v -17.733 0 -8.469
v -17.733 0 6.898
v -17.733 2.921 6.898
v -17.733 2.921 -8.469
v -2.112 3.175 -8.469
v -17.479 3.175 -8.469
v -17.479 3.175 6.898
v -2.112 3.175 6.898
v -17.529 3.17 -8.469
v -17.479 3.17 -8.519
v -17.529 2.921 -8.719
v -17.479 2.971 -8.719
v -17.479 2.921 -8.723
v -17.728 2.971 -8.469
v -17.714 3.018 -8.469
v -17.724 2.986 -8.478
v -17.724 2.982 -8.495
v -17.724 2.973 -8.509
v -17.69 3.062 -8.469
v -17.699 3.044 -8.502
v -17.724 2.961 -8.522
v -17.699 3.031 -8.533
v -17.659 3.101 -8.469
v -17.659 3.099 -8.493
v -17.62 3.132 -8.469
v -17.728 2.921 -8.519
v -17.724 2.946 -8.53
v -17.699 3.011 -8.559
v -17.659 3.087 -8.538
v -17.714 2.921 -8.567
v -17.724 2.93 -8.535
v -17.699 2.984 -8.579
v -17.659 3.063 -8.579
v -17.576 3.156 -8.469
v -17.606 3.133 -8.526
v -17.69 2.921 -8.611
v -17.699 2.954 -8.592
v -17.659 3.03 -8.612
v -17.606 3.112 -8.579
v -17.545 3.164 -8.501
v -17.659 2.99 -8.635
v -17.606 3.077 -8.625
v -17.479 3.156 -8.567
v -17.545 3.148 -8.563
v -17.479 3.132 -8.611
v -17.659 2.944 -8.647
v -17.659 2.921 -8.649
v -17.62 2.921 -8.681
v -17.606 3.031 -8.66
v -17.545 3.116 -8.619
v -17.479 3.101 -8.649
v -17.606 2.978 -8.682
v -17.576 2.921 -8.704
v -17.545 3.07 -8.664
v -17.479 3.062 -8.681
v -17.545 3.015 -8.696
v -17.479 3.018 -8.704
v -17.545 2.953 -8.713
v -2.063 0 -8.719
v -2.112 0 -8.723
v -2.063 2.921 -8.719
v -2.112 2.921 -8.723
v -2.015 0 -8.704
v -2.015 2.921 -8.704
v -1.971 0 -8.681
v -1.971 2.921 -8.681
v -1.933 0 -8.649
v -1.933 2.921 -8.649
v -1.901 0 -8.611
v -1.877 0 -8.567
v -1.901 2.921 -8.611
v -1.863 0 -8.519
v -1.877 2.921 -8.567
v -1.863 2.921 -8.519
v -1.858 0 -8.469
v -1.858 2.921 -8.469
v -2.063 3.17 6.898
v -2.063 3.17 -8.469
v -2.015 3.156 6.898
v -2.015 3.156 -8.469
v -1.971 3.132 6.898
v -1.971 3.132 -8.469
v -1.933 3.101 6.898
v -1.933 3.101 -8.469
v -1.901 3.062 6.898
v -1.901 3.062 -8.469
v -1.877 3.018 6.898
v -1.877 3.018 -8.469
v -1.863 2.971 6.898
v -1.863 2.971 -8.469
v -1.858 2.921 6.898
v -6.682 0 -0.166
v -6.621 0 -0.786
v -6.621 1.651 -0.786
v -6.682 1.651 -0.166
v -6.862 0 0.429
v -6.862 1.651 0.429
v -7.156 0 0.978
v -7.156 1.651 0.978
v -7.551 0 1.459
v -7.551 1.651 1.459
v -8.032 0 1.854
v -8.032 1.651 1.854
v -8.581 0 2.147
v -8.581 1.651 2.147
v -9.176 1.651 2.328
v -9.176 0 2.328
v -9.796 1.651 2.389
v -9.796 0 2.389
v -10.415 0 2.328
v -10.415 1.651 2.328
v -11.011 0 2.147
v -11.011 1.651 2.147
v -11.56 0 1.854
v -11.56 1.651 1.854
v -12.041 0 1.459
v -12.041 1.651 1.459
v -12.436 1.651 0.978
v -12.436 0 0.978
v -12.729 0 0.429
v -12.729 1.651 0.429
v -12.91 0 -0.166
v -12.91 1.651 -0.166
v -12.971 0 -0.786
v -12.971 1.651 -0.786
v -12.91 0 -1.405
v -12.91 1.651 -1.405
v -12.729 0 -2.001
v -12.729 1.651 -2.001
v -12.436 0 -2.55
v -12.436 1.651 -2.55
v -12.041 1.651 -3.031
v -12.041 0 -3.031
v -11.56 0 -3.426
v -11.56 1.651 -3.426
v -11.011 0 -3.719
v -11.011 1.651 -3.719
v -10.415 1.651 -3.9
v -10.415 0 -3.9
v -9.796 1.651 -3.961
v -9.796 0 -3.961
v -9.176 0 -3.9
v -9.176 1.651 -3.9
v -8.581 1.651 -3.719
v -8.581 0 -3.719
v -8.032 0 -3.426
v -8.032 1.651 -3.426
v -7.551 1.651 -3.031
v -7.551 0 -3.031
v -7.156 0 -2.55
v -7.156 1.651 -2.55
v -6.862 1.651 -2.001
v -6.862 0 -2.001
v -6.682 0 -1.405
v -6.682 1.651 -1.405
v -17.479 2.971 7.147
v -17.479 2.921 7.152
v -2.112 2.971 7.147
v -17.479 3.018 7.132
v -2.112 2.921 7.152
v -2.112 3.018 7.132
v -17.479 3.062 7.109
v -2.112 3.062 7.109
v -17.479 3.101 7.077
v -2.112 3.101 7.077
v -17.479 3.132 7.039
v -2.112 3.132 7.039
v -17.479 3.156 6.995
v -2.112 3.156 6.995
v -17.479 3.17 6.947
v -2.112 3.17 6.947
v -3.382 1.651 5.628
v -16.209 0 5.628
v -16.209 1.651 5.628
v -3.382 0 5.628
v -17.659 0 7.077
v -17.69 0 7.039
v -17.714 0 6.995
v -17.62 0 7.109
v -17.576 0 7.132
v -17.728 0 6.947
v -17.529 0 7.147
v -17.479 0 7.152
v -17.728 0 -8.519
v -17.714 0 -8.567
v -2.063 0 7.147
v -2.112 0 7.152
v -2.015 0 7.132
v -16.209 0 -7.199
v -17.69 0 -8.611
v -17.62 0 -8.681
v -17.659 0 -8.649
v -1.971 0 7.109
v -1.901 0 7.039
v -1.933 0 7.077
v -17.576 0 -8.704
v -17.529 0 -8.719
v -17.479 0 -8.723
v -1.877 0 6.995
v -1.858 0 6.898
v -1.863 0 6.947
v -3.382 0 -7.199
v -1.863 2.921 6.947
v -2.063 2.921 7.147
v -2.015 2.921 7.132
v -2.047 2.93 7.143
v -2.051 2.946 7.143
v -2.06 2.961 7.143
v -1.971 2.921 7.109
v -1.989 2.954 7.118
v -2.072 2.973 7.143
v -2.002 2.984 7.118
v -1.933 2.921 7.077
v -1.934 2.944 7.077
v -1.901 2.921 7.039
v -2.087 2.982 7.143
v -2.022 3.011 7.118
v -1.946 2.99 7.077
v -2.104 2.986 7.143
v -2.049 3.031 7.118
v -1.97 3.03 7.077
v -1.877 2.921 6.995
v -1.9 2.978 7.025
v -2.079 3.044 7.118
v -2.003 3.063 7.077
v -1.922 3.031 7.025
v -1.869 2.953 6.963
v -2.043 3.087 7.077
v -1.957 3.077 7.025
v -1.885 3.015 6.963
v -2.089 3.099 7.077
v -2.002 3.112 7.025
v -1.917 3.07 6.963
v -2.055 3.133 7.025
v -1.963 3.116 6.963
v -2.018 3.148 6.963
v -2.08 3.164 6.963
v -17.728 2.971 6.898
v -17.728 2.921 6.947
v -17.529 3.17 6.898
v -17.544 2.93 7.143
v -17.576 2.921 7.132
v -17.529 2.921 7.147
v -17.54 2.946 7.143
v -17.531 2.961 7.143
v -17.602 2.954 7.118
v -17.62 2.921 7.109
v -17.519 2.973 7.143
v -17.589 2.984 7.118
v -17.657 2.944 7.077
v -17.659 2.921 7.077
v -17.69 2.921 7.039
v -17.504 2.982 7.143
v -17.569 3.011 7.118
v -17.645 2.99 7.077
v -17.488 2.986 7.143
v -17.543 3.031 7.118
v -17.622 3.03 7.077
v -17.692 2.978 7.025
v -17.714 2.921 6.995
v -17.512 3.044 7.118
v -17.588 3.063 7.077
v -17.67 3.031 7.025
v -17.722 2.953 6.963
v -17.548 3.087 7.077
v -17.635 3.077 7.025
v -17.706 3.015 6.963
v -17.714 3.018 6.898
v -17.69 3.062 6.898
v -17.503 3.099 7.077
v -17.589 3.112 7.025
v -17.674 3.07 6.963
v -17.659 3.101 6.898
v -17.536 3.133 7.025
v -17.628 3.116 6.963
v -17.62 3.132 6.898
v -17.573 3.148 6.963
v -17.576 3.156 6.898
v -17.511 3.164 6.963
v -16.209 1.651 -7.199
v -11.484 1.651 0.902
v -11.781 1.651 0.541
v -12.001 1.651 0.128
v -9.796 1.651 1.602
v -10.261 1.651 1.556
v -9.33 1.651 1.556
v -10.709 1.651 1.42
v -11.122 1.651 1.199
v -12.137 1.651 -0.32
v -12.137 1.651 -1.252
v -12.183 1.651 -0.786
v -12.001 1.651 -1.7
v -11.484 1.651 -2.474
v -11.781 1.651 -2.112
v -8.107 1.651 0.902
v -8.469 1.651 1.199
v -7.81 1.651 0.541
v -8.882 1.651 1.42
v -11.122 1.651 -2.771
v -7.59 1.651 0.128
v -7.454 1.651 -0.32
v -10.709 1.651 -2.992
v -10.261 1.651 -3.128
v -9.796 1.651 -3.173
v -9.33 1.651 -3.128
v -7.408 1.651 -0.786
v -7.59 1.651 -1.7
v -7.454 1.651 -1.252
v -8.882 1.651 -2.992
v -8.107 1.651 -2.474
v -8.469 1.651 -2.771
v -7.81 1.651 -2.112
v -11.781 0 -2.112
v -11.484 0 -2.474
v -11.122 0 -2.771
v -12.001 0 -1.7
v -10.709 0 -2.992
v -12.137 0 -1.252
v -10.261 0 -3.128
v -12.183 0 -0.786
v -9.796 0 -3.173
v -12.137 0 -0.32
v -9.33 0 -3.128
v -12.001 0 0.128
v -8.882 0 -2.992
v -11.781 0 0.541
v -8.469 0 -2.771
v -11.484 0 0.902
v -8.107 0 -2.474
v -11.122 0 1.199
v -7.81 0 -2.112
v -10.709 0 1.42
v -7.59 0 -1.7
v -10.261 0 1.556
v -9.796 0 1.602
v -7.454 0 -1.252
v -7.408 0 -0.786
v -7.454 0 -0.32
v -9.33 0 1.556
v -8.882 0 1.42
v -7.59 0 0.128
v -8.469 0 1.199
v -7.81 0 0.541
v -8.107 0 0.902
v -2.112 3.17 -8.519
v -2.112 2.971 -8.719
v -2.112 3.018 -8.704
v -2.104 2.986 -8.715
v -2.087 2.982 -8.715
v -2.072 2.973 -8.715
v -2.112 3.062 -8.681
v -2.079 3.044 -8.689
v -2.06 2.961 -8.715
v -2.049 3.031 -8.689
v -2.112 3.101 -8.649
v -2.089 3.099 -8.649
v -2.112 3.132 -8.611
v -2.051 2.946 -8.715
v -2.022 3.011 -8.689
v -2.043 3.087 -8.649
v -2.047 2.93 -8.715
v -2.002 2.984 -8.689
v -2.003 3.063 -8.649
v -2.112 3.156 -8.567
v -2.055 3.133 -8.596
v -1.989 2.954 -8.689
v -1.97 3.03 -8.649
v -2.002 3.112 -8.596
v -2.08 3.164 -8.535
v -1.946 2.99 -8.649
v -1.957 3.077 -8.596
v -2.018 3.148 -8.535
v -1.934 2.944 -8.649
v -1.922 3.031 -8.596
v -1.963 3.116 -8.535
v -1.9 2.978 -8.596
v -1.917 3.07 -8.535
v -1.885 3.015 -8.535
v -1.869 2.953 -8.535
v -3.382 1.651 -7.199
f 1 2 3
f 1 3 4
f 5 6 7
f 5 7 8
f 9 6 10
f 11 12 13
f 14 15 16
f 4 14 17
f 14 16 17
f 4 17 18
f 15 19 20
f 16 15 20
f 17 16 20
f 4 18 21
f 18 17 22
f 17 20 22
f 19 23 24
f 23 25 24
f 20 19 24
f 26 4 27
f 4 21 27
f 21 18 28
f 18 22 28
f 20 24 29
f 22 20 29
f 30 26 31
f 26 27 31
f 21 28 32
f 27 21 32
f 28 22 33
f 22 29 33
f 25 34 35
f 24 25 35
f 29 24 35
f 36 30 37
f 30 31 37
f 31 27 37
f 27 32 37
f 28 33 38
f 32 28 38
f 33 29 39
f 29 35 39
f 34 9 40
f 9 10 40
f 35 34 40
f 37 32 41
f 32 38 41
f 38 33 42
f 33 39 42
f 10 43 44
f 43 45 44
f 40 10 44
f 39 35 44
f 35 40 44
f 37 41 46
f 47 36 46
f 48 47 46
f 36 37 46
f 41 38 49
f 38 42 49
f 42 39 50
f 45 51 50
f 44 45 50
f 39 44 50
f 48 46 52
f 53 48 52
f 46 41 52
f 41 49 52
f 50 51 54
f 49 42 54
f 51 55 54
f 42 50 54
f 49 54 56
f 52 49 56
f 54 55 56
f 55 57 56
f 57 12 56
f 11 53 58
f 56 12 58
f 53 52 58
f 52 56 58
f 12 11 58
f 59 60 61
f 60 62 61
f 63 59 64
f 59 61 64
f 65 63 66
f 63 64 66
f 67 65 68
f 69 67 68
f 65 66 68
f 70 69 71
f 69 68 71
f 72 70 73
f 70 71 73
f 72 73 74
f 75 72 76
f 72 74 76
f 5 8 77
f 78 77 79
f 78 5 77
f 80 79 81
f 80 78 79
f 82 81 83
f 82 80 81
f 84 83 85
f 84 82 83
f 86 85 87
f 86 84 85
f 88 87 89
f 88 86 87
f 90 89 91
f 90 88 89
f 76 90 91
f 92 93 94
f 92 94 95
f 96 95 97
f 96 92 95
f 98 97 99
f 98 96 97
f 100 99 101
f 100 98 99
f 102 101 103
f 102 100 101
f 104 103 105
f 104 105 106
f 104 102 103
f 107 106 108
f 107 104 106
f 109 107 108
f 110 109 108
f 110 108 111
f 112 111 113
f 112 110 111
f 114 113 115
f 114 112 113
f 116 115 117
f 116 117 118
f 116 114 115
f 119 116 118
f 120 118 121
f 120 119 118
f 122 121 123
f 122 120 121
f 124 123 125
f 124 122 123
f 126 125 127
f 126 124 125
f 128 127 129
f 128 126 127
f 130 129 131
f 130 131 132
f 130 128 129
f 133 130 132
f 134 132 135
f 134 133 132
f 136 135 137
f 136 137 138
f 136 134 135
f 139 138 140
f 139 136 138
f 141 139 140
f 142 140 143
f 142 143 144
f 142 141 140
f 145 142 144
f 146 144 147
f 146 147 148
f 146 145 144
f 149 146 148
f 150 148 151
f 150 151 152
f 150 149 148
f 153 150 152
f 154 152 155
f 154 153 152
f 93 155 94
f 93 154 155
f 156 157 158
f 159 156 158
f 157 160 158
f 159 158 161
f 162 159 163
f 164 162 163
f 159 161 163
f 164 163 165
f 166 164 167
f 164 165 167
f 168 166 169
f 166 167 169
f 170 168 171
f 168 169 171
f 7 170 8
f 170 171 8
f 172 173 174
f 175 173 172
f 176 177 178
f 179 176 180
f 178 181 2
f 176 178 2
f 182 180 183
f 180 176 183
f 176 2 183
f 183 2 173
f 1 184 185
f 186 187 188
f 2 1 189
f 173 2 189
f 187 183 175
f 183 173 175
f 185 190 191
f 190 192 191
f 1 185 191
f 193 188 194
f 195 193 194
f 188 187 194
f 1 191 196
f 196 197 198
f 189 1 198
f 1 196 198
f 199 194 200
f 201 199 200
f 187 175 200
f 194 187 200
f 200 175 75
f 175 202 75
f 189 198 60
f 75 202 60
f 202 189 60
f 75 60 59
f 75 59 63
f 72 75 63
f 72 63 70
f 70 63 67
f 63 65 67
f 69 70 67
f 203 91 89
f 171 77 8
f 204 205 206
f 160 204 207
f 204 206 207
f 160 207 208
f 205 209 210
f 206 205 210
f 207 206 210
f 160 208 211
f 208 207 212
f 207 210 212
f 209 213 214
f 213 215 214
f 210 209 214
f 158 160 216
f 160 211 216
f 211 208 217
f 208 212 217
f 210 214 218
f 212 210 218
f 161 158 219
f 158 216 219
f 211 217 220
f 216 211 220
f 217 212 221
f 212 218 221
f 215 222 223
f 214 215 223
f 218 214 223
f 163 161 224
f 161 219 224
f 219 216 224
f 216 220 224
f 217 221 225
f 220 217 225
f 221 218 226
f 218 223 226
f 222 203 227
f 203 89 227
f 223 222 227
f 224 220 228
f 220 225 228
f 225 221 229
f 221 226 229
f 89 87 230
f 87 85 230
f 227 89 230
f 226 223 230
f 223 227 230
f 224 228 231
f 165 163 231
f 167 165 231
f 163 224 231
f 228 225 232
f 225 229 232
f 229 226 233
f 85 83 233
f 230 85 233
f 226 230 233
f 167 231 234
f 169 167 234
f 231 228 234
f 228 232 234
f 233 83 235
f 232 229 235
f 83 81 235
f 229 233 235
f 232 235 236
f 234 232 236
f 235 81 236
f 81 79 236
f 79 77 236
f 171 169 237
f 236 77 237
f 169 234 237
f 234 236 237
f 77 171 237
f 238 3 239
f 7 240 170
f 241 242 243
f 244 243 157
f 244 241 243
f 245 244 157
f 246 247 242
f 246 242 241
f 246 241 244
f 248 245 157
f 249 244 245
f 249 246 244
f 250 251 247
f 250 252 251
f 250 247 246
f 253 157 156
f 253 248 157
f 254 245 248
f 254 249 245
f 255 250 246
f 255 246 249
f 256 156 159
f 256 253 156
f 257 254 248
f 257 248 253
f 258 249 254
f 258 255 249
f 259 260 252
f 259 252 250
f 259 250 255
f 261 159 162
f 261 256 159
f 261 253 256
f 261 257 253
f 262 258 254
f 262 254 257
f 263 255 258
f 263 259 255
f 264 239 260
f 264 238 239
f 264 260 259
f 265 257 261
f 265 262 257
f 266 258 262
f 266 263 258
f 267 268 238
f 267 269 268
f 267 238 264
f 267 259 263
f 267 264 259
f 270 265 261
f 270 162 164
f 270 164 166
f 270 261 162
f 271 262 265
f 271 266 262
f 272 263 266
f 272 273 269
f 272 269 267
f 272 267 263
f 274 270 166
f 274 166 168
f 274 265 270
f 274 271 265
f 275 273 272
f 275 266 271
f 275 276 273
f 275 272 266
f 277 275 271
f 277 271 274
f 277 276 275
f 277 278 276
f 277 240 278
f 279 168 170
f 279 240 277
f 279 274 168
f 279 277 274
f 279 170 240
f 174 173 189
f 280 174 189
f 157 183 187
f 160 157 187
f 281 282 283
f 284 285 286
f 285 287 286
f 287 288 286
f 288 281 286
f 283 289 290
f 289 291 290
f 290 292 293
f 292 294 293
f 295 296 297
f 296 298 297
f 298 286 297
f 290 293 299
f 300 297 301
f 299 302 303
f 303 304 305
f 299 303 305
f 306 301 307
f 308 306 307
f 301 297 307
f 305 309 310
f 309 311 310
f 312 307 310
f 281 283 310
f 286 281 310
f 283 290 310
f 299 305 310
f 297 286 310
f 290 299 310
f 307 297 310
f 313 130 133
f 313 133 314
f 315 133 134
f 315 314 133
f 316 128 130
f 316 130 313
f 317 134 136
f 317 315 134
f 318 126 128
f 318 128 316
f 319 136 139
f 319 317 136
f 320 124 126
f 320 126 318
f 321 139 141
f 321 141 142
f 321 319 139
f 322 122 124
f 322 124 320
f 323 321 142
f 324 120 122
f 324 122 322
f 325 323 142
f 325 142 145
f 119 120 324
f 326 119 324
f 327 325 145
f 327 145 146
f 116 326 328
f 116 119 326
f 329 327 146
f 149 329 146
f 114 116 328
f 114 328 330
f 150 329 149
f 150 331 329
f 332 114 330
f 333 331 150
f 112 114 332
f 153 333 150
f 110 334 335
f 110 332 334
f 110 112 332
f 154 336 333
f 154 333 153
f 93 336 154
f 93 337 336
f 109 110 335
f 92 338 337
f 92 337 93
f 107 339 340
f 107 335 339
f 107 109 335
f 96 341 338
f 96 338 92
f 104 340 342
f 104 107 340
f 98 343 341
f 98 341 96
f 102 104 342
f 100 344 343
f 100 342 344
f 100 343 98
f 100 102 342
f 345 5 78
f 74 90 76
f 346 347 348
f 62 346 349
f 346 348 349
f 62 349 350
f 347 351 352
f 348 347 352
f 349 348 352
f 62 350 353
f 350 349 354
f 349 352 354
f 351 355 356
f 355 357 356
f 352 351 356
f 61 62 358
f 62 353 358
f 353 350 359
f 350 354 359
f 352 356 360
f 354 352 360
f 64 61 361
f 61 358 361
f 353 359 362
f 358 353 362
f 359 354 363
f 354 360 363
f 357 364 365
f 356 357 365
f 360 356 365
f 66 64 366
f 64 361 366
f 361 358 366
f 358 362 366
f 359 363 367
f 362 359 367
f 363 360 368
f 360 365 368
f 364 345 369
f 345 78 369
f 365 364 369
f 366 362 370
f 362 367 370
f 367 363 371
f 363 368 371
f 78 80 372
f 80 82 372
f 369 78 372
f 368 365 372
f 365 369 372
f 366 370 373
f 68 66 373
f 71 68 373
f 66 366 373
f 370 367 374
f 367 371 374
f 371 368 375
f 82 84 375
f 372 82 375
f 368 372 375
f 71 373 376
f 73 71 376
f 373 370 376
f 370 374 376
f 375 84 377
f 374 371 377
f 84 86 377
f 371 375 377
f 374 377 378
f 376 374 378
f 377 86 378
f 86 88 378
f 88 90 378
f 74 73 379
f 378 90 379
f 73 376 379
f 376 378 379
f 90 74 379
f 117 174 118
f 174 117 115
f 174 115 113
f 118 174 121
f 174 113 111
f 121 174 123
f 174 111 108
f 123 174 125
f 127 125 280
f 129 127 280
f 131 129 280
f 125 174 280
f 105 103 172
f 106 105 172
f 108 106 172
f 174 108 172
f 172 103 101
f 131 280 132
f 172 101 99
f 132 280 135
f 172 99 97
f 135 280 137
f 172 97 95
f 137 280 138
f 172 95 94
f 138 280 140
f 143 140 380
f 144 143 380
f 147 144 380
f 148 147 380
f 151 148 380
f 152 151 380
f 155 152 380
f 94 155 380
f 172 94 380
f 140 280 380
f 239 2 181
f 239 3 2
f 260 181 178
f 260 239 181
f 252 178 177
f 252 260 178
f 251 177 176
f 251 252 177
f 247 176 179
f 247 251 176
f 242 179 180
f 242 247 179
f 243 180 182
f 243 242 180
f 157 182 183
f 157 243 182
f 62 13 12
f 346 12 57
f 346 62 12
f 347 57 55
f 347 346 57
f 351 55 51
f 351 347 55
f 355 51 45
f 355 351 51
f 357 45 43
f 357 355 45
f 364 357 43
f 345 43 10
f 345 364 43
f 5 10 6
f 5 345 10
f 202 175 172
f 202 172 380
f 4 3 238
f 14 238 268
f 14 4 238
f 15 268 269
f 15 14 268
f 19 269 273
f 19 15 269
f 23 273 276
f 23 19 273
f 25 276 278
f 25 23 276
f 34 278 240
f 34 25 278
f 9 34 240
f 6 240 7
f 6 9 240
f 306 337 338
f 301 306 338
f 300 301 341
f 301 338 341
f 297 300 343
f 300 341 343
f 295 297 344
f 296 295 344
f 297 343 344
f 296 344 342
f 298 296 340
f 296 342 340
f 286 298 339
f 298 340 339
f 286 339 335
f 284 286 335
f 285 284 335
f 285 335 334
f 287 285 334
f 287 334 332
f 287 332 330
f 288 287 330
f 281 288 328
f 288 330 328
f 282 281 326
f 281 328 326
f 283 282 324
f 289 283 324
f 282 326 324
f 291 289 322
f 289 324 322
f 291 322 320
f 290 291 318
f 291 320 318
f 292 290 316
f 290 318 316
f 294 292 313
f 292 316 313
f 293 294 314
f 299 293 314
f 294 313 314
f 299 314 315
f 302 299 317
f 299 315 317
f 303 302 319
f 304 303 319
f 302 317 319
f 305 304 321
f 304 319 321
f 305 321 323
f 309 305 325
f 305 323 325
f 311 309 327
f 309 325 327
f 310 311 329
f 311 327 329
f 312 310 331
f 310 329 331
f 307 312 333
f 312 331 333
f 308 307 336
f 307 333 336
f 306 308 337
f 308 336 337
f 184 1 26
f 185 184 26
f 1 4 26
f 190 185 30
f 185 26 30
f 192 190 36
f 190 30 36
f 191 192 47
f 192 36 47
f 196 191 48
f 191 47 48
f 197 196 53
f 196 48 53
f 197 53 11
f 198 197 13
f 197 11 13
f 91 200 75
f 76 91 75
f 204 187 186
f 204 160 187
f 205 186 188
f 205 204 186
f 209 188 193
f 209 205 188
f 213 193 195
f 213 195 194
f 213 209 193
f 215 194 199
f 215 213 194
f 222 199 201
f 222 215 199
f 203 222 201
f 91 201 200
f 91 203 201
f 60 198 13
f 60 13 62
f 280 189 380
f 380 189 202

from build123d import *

# Parameters (mm, degrees)
SKETCH2_W           = 15.875
SKETCH2_H           = 15.875
BOSS_EXTRUDE3_DEPTH = 3.175
SHELL1_T            = -1.524
SKETCH5_R           = 3.175
SKETCH5_R_2         = 2.3876
BOSS_EXTRUDE6_DEPTH = 1.651
FILLET1_R           = 0.254


with BuildPart() as part:
    # Sketch2 → Boss-Extrude3 (new body)
    with BuildSketch(Plane(origin=(0, 0, 0), x_dir=(1, 0, 0), z_dir=(0, 1, 0))):
        with Locations((-9.795613381, 0.785891089)):
            Rectangle(SKETCH2_W, SKETCH2_H)
    extrude(amount=BOSS_EXTRUDE3_DEPTH)

    # Shell1
    shell1_openings = [part.faces().sort_by_distance(p)[0] for p in [
        (-9.795613381, 0, -0.785891089),
    ]]
    offset(amount=SHELL1_T, openings=shell1_openings, kind=Kind.INTERSECTION)

    # Sketch5 → Boss-Extrude6 (add)
    with BuildSketch(Plane.XZ):
        with Locations((-9.795613381, -0.785891089)):
            Circle(SKETCH5_R)
        with Locations((-9.795613381, -0.785891089)):
            Circle(SKETCH5_R_2, mode=Mode.SUBTRACT)
    extrude(amount=-BOSS_EXTRUDE6_DEPTH)

    # Fillet1
    fillet1_edges = [part.edges().sort_by_distance(p)[0] for p in [
        (-1.858113381, 3.175, -0.785891089),
        (-9.795613381, 3.175, -8.723391089),
        (-17.733113381, 3.175, -0.785891089),
        (-17.733113381, 1.5875, -8.723391089),
        (-1.858113381, 1.5875, -8.723391089),
        (-1.858113381, 1.5875, 7.151608911),
        (-17.733113381, 1.5875, 7.151608911),
        (-9.795613381, 3.175, 7.151608911),
    ]]
    fillet(fillet1_edges, radius=FILLET1_R)


solid = part.part
